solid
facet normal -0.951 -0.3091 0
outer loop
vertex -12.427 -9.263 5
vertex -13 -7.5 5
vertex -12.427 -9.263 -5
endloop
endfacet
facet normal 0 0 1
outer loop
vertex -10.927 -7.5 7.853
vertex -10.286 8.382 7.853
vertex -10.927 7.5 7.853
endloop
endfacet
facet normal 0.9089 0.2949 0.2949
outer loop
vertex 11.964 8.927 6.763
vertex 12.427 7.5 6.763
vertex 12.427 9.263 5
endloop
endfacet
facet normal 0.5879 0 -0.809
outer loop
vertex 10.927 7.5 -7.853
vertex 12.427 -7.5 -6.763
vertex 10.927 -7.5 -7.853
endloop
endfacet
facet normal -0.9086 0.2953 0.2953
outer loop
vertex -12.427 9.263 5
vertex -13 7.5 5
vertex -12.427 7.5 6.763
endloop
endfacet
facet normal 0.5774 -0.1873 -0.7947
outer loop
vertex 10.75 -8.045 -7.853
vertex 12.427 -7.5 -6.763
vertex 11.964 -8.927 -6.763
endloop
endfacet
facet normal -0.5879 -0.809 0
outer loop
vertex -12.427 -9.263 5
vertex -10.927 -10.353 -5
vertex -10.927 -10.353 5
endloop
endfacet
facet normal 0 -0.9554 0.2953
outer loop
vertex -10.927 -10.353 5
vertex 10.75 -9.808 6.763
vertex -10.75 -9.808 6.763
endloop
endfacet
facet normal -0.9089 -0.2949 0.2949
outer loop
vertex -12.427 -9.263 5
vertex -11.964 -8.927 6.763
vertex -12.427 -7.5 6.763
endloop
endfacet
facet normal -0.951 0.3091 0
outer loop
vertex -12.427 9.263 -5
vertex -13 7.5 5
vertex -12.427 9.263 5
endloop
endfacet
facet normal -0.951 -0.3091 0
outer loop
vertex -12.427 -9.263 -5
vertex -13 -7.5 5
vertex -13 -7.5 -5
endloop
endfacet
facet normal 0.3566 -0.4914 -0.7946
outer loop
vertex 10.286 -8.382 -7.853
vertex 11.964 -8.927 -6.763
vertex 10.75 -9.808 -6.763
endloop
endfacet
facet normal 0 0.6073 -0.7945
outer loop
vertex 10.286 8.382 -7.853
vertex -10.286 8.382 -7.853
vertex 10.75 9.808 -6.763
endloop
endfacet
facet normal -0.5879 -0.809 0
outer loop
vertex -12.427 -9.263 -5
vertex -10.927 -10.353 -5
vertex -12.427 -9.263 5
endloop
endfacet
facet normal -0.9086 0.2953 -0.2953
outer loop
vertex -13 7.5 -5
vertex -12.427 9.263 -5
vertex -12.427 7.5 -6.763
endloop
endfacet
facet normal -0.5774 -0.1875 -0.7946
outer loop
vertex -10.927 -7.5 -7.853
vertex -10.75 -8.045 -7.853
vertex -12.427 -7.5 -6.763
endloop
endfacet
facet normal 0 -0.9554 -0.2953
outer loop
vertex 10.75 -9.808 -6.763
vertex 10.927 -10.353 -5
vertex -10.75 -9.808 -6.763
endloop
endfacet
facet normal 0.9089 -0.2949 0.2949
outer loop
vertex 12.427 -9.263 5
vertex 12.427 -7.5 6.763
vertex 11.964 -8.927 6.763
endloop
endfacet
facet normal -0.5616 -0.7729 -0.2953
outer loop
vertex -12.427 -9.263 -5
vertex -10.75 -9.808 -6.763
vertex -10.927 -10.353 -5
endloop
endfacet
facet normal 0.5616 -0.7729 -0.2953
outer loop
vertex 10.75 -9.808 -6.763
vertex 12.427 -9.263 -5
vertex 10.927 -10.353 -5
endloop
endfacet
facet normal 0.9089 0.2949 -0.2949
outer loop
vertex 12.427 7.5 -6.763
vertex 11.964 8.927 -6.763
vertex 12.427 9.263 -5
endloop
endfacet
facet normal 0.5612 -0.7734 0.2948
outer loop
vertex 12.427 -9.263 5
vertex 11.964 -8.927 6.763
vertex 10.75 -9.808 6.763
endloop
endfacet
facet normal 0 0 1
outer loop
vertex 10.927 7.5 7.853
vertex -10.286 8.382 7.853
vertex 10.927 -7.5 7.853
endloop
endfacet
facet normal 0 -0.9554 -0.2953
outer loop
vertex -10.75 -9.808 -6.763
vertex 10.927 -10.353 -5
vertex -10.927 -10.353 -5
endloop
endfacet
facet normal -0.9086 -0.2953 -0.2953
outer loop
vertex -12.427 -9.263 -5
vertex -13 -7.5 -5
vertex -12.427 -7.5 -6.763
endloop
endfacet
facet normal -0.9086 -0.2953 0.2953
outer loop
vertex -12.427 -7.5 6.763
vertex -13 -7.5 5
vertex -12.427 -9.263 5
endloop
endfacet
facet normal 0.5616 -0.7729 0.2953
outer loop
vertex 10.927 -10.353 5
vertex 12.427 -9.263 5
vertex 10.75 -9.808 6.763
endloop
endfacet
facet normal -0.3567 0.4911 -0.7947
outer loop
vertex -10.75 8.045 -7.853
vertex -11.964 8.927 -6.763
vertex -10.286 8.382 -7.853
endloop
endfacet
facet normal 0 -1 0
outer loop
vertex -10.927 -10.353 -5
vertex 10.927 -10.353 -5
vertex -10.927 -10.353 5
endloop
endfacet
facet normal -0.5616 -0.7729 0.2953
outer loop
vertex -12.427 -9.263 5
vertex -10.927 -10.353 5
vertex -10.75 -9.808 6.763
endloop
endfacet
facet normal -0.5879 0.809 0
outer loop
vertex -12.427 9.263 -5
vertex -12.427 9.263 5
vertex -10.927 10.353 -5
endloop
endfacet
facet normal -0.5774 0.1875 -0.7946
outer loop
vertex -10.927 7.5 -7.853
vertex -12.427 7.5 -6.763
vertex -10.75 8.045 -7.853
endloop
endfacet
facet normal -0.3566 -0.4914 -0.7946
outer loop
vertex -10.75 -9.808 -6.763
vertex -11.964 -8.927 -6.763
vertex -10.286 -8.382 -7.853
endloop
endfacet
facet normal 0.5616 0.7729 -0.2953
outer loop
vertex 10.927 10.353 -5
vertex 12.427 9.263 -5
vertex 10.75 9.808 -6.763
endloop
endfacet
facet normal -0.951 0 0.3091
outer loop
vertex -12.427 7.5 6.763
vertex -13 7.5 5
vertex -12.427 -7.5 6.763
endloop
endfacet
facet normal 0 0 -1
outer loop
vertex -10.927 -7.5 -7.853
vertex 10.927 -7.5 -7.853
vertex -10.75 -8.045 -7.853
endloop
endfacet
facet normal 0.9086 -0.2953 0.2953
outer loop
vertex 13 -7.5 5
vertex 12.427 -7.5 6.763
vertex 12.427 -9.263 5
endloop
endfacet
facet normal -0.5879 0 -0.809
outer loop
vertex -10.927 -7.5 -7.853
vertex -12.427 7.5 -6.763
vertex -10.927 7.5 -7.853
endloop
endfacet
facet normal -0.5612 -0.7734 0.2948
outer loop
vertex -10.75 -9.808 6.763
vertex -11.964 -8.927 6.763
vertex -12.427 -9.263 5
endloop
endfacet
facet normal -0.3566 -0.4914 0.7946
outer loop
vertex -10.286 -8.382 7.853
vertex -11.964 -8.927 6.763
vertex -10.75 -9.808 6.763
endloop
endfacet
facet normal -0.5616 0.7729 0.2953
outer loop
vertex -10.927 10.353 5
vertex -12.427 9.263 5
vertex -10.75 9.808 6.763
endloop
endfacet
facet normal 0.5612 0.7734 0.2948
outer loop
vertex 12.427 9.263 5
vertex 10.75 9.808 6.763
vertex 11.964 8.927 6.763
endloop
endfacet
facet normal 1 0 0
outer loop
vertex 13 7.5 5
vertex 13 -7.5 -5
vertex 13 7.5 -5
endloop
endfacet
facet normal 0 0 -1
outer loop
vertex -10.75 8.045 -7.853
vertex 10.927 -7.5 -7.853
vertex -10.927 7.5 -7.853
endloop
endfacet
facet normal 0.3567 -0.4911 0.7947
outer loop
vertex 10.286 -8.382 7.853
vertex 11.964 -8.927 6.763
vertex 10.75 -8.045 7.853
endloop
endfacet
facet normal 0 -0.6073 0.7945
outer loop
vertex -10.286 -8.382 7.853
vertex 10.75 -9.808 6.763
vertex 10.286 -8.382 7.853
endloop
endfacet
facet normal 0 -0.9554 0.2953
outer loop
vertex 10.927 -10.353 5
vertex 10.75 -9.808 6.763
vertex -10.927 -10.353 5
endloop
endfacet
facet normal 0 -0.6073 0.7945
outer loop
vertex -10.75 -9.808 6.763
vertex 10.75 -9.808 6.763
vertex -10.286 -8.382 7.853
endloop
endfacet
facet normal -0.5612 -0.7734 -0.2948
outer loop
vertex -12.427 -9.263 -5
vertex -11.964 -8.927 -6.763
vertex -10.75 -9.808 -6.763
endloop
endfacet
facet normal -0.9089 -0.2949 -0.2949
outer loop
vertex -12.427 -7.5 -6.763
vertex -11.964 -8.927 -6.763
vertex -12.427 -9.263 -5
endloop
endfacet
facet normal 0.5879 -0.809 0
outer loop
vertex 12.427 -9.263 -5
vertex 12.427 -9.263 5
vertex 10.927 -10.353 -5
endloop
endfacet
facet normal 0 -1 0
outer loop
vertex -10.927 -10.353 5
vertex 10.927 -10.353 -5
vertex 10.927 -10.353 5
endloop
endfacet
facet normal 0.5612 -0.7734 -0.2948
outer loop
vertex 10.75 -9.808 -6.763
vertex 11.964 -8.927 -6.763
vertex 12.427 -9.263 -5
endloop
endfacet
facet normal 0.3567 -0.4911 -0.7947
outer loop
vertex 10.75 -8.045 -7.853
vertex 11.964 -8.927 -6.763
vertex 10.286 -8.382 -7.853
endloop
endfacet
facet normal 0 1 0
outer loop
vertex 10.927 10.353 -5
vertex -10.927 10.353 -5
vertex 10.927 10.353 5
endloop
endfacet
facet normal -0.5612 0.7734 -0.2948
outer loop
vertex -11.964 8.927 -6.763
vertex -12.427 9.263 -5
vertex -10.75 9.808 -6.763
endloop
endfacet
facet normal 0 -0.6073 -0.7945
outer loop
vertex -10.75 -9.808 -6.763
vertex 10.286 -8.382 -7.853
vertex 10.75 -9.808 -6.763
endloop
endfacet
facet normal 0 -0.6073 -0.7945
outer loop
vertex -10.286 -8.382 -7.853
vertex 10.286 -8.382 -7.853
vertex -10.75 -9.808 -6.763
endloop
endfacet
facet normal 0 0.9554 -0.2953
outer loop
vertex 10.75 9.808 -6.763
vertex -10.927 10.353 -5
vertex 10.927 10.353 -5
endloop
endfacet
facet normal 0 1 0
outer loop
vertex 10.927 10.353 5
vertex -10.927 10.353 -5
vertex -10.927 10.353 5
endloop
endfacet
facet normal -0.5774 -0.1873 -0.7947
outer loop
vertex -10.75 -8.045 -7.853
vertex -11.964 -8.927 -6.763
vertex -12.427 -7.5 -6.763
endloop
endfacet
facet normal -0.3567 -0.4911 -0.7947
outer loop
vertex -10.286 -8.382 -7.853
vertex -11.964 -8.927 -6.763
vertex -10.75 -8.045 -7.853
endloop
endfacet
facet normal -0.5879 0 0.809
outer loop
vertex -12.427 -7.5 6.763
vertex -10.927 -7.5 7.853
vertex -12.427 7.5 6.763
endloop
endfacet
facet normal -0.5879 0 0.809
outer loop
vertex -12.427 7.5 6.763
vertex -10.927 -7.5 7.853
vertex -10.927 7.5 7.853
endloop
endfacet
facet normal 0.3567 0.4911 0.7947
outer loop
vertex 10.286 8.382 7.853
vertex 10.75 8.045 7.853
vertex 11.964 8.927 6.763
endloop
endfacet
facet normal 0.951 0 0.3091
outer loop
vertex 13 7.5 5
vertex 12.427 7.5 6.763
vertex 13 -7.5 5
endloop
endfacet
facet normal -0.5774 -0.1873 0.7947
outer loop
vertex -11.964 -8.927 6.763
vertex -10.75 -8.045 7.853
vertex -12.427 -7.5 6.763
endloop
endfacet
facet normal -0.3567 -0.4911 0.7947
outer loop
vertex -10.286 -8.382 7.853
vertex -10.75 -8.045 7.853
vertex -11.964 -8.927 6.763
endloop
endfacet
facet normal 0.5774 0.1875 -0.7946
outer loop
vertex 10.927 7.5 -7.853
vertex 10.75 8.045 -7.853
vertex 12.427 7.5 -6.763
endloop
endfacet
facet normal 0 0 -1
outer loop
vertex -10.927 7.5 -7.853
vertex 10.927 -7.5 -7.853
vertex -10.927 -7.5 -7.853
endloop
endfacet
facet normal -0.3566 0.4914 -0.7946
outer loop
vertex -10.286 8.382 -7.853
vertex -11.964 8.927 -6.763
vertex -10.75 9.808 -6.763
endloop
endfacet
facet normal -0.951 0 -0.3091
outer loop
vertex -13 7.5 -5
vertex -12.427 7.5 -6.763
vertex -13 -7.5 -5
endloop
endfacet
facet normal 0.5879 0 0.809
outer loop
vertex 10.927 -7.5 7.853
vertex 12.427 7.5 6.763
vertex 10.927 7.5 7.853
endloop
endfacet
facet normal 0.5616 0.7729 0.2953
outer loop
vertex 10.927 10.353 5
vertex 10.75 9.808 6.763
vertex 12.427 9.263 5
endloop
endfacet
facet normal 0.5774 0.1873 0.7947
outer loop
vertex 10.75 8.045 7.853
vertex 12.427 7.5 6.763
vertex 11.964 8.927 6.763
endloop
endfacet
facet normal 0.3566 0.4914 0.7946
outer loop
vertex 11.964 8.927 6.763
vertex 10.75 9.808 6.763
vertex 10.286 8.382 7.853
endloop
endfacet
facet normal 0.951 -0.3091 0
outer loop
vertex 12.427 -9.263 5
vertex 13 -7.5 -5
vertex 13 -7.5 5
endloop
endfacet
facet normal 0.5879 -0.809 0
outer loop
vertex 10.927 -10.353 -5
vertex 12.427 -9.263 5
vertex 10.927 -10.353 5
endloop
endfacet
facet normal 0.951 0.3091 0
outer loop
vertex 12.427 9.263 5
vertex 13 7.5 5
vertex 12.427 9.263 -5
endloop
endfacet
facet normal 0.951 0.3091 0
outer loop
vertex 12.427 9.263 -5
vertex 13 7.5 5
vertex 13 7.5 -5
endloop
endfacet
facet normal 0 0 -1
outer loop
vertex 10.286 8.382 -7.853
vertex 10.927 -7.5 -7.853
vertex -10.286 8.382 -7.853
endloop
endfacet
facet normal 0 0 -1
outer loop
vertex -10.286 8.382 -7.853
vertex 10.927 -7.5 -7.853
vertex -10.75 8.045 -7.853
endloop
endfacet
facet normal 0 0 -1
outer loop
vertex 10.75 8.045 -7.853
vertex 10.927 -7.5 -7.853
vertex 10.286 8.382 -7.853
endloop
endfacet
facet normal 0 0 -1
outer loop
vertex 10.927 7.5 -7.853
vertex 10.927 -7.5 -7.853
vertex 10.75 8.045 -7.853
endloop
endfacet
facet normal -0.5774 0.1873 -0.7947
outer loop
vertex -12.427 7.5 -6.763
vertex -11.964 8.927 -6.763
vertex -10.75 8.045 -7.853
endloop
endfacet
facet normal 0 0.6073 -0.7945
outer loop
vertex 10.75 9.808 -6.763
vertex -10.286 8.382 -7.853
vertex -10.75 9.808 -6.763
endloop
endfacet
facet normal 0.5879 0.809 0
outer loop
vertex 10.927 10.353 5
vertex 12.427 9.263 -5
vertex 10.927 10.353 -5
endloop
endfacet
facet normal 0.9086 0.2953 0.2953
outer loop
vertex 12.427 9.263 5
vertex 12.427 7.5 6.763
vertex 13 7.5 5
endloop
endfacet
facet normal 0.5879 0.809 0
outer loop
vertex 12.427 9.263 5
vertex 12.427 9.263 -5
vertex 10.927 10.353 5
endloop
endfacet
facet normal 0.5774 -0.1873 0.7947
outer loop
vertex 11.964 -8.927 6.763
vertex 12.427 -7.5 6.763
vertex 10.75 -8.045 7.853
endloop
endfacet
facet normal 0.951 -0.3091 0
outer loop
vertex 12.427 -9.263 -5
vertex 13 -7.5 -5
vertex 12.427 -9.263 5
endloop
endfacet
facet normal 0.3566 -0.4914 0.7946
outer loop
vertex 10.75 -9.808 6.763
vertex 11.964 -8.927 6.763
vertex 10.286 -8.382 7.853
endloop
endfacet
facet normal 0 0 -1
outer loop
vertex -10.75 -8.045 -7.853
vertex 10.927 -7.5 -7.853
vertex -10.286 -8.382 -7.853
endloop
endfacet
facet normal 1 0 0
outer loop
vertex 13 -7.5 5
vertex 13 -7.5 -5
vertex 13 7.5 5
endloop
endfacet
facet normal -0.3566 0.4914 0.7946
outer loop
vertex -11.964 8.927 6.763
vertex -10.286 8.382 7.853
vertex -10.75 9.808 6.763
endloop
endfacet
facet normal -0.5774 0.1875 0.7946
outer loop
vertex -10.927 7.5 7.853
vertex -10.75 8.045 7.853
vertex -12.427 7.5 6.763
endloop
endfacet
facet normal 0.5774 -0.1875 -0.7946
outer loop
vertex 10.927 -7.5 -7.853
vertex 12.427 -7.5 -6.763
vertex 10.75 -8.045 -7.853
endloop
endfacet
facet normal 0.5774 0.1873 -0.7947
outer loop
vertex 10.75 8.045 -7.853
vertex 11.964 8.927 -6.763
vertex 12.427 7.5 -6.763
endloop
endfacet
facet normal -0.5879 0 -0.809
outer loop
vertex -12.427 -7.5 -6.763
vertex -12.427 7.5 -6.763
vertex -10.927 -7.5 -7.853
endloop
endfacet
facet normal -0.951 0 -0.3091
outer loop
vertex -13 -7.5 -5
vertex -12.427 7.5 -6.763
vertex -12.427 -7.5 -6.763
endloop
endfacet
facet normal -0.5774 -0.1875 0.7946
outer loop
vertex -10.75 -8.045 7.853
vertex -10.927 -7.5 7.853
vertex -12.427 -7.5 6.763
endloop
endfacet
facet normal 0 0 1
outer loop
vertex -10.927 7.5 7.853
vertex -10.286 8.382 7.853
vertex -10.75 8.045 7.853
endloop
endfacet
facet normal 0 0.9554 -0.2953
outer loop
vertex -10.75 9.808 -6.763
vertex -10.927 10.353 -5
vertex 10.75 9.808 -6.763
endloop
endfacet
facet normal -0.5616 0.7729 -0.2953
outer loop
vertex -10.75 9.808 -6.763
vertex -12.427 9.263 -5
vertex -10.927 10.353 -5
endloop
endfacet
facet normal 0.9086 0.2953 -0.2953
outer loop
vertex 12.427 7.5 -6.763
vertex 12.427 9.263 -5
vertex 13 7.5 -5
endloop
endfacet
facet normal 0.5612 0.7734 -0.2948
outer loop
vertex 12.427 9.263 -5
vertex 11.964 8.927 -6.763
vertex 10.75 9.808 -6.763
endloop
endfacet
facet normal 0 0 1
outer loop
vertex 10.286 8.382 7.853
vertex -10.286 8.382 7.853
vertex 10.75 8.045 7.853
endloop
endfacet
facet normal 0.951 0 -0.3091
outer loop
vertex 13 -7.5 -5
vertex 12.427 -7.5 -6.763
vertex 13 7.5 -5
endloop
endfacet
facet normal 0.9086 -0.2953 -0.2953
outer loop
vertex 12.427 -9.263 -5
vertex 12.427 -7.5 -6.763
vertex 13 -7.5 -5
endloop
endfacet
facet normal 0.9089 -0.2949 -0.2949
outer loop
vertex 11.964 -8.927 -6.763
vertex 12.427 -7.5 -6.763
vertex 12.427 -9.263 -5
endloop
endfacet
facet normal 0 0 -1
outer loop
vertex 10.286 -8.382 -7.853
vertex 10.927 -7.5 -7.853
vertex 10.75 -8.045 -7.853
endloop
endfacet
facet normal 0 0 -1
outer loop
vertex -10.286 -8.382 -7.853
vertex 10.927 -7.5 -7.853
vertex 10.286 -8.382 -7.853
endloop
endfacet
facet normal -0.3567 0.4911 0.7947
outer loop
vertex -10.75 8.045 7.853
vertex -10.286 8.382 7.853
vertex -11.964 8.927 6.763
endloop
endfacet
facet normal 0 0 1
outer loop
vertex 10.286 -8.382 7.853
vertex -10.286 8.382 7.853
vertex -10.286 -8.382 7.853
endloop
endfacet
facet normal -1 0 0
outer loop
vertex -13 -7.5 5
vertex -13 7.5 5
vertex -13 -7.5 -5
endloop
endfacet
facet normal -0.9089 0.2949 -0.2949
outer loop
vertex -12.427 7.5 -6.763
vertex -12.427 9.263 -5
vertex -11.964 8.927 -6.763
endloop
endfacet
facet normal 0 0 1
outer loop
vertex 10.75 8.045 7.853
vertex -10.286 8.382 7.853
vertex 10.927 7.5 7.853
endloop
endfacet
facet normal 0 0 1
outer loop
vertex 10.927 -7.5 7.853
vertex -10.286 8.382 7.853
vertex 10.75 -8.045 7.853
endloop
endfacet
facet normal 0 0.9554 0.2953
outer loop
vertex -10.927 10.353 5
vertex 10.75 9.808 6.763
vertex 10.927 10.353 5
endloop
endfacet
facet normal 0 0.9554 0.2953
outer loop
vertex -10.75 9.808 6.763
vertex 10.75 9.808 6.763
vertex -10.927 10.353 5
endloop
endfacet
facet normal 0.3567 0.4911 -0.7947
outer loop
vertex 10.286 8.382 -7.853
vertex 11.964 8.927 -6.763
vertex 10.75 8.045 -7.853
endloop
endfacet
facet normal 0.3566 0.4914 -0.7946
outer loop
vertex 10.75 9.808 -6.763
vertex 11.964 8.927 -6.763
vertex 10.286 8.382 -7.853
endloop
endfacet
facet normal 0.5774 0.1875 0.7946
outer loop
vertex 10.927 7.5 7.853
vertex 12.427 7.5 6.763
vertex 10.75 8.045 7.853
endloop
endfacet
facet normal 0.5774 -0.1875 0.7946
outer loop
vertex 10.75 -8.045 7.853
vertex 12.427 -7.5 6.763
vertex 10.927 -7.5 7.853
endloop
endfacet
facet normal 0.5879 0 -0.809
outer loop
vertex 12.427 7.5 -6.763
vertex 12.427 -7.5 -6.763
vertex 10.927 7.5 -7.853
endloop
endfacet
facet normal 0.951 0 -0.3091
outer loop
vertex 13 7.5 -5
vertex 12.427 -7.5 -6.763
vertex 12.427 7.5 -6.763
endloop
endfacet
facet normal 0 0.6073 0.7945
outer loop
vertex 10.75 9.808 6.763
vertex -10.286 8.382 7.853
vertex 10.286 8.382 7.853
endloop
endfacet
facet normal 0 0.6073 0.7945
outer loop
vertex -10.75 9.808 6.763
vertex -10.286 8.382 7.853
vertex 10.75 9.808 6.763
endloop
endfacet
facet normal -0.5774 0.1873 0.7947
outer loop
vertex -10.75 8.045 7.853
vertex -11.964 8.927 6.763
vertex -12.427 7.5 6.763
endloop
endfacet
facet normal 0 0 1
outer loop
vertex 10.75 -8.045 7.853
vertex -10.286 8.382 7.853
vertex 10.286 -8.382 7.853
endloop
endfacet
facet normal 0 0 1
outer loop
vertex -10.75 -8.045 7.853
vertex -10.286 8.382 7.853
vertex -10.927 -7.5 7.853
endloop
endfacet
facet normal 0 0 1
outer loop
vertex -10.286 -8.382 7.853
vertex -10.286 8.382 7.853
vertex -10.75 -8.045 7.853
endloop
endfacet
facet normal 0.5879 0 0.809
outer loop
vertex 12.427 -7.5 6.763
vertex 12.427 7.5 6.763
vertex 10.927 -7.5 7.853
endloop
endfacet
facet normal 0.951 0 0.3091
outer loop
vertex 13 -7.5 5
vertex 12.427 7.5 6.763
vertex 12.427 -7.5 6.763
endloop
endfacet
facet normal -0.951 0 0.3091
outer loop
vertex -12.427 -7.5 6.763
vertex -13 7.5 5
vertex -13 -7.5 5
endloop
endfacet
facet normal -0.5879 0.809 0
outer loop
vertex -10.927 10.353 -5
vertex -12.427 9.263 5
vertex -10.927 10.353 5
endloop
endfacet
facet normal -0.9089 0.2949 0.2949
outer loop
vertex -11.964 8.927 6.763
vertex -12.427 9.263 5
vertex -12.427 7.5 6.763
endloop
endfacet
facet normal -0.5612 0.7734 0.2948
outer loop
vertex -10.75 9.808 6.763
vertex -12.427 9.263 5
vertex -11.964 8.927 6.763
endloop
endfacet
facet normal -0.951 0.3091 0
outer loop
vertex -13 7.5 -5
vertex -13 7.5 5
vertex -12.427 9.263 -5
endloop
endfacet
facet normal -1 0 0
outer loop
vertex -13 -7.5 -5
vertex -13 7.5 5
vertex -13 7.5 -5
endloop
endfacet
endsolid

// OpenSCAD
hull() {
    translate([-10,-7.5,-5]) sphere(r=3);
    translate([-10,-7.5,5]) sphere(r=3);
    translate([-10,7.5,-5]) sphere(r=3);
    translate([-10,7.5,5]) sphere(r=3);
    translate([10,-7.5,-5]) sphere(r=3);
    translate([10,-7.5,5]) sphere(r=3);
    translate([10,7.5,-5]) sphere(r=3);
    translate([10,7.5,5]) sphere(r=3);
}
